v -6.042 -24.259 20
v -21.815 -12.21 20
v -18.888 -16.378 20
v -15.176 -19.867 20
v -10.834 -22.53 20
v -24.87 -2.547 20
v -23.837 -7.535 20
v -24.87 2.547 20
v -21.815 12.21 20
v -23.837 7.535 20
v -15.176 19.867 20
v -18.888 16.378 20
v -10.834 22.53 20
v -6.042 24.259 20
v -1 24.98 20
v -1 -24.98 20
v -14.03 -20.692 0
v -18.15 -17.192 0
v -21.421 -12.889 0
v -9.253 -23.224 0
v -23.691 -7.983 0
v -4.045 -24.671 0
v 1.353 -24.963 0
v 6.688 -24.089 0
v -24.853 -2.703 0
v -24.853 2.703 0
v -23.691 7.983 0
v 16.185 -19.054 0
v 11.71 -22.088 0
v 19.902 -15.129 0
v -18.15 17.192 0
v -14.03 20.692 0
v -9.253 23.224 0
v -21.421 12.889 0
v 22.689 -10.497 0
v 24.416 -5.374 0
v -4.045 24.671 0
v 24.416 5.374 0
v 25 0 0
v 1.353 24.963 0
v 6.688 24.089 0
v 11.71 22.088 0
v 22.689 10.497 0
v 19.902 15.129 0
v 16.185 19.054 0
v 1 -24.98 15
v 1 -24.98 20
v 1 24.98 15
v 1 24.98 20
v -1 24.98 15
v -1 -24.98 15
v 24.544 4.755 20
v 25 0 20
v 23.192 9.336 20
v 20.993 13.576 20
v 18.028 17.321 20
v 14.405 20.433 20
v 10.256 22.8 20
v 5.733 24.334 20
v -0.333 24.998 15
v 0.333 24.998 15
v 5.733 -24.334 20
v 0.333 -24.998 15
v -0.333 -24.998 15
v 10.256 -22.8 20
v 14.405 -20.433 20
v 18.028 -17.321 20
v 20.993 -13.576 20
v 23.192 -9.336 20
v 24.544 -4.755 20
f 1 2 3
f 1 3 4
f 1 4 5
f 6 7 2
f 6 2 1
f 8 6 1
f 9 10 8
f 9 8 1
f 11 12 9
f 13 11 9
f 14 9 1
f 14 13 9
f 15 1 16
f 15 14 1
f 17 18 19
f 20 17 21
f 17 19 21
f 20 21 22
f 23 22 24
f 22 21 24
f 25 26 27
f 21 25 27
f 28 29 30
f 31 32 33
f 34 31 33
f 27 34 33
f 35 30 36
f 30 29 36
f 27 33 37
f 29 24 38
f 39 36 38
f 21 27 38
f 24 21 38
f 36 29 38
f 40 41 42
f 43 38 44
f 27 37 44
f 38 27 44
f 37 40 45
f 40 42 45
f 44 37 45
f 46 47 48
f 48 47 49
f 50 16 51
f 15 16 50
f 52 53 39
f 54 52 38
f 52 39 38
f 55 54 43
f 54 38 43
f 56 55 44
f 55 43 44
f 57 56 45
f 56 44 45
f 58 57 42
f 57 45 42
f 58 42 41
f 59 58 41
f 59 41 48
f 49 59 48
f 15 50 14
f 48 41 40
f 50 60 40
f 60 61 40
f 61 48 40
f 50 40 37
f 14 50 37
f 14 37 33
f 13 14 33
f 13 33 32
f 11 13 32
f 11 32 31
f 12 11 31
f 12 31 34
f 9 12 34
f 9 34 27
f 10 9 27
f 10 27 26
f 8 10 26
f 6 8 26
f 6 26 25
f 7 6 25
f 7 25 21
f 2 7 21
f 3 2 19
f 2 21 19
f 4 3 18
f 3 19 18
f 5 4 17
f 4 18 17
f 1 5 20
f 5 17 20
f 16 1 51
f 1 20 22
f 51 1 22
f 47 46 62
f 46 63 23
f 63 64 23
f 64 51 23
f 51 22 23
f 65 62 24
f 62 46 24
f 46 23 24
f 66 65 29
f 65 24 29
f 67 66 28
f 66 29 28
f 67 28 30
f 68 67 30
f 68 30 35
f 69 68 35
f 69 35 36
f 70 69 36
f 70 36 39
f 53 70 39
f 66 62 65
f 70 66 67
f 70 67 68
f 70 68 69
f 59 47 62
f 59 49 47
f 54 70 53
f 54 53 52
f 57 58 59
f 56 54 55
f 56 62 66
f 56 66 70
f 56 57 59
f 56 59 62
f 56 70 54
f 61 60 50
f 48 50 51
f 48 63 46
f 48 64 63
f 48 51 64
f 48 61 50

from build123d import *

# Parameters (mm, degrees)
SKETCH1_R           = 25
BOSS_EXTRUDE1_DEPTH = 20
SKETCH2_W           = 2
SKETCH2_H           = 50
CUT_EXTRUDE1_DEPTH  = 5


with BuildPart() as part:
    # Sketch1 → Boss-Extrude1 (new body)
    with BuildSketch(Plane.XY):
        Circle(SKETCH1_R)
    extrude(amount=BOSS_EXTRUDE1_DEPTH)

    # Sketch2 → Cut-Extrude1 (cut)
    with BuildSketch(Plane.XY.offset(20)):
        Rectangle(SKETCH2_W, SKETCH2_H)
    extrude(amount=-CUT_EXTRUDE1_DEPTH, mode=Mode.SUBTRACT)


solid = part.part
